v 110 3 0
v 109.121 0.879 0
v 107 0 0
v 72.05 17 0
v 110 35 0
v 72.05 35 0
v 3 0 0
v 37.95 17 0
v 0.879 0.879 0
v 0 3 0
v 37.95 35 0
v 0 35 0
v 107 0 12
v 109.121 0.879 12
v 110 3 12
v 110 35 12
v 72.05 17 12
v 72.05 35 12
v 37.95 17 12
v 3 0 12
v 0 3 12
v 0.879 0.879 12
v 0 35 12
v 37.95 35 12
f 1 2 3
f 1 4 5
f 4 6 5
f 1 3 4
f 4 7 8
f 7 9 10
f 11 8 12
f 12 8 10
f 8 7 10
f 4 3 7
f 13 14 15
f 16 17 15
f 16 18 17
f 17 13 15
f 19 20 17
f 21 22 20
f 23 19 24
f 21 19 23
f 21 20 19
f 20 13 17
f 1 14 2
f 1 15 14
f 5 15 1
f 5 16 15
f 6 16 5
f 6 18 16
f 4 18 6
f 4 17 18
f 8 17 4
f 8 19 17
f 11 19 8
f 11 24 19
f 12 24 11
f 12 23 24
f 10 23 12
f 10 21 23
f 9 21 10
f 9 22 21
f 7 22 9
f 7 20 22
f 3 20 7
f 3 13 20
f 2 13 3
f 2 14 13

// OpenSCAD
$fn = 32;

// ----------------------------------------------------------------------
// Window plate: 110 x 35 mm, 1 open windows
// ----------------------------------------------------------------------

// --- parameters (mm) ---
profile_height = 12;      // extrusion height
profile_points = 12;      // points of the closed outline

profile = [[0, 3], [0.879, 0.879], [3, 0], [107, 0], [109.121, 0.879], [110, 3], [110, 35], [72.05, 35], [72.05, 17], [37.95, 17], [37.95, 35], [0, 35]];  // single closed polygon, 12 points, counter clockwise

// --- the one profile operation ---
linear_extrude(height = profile_height) polygon(points = profile);
